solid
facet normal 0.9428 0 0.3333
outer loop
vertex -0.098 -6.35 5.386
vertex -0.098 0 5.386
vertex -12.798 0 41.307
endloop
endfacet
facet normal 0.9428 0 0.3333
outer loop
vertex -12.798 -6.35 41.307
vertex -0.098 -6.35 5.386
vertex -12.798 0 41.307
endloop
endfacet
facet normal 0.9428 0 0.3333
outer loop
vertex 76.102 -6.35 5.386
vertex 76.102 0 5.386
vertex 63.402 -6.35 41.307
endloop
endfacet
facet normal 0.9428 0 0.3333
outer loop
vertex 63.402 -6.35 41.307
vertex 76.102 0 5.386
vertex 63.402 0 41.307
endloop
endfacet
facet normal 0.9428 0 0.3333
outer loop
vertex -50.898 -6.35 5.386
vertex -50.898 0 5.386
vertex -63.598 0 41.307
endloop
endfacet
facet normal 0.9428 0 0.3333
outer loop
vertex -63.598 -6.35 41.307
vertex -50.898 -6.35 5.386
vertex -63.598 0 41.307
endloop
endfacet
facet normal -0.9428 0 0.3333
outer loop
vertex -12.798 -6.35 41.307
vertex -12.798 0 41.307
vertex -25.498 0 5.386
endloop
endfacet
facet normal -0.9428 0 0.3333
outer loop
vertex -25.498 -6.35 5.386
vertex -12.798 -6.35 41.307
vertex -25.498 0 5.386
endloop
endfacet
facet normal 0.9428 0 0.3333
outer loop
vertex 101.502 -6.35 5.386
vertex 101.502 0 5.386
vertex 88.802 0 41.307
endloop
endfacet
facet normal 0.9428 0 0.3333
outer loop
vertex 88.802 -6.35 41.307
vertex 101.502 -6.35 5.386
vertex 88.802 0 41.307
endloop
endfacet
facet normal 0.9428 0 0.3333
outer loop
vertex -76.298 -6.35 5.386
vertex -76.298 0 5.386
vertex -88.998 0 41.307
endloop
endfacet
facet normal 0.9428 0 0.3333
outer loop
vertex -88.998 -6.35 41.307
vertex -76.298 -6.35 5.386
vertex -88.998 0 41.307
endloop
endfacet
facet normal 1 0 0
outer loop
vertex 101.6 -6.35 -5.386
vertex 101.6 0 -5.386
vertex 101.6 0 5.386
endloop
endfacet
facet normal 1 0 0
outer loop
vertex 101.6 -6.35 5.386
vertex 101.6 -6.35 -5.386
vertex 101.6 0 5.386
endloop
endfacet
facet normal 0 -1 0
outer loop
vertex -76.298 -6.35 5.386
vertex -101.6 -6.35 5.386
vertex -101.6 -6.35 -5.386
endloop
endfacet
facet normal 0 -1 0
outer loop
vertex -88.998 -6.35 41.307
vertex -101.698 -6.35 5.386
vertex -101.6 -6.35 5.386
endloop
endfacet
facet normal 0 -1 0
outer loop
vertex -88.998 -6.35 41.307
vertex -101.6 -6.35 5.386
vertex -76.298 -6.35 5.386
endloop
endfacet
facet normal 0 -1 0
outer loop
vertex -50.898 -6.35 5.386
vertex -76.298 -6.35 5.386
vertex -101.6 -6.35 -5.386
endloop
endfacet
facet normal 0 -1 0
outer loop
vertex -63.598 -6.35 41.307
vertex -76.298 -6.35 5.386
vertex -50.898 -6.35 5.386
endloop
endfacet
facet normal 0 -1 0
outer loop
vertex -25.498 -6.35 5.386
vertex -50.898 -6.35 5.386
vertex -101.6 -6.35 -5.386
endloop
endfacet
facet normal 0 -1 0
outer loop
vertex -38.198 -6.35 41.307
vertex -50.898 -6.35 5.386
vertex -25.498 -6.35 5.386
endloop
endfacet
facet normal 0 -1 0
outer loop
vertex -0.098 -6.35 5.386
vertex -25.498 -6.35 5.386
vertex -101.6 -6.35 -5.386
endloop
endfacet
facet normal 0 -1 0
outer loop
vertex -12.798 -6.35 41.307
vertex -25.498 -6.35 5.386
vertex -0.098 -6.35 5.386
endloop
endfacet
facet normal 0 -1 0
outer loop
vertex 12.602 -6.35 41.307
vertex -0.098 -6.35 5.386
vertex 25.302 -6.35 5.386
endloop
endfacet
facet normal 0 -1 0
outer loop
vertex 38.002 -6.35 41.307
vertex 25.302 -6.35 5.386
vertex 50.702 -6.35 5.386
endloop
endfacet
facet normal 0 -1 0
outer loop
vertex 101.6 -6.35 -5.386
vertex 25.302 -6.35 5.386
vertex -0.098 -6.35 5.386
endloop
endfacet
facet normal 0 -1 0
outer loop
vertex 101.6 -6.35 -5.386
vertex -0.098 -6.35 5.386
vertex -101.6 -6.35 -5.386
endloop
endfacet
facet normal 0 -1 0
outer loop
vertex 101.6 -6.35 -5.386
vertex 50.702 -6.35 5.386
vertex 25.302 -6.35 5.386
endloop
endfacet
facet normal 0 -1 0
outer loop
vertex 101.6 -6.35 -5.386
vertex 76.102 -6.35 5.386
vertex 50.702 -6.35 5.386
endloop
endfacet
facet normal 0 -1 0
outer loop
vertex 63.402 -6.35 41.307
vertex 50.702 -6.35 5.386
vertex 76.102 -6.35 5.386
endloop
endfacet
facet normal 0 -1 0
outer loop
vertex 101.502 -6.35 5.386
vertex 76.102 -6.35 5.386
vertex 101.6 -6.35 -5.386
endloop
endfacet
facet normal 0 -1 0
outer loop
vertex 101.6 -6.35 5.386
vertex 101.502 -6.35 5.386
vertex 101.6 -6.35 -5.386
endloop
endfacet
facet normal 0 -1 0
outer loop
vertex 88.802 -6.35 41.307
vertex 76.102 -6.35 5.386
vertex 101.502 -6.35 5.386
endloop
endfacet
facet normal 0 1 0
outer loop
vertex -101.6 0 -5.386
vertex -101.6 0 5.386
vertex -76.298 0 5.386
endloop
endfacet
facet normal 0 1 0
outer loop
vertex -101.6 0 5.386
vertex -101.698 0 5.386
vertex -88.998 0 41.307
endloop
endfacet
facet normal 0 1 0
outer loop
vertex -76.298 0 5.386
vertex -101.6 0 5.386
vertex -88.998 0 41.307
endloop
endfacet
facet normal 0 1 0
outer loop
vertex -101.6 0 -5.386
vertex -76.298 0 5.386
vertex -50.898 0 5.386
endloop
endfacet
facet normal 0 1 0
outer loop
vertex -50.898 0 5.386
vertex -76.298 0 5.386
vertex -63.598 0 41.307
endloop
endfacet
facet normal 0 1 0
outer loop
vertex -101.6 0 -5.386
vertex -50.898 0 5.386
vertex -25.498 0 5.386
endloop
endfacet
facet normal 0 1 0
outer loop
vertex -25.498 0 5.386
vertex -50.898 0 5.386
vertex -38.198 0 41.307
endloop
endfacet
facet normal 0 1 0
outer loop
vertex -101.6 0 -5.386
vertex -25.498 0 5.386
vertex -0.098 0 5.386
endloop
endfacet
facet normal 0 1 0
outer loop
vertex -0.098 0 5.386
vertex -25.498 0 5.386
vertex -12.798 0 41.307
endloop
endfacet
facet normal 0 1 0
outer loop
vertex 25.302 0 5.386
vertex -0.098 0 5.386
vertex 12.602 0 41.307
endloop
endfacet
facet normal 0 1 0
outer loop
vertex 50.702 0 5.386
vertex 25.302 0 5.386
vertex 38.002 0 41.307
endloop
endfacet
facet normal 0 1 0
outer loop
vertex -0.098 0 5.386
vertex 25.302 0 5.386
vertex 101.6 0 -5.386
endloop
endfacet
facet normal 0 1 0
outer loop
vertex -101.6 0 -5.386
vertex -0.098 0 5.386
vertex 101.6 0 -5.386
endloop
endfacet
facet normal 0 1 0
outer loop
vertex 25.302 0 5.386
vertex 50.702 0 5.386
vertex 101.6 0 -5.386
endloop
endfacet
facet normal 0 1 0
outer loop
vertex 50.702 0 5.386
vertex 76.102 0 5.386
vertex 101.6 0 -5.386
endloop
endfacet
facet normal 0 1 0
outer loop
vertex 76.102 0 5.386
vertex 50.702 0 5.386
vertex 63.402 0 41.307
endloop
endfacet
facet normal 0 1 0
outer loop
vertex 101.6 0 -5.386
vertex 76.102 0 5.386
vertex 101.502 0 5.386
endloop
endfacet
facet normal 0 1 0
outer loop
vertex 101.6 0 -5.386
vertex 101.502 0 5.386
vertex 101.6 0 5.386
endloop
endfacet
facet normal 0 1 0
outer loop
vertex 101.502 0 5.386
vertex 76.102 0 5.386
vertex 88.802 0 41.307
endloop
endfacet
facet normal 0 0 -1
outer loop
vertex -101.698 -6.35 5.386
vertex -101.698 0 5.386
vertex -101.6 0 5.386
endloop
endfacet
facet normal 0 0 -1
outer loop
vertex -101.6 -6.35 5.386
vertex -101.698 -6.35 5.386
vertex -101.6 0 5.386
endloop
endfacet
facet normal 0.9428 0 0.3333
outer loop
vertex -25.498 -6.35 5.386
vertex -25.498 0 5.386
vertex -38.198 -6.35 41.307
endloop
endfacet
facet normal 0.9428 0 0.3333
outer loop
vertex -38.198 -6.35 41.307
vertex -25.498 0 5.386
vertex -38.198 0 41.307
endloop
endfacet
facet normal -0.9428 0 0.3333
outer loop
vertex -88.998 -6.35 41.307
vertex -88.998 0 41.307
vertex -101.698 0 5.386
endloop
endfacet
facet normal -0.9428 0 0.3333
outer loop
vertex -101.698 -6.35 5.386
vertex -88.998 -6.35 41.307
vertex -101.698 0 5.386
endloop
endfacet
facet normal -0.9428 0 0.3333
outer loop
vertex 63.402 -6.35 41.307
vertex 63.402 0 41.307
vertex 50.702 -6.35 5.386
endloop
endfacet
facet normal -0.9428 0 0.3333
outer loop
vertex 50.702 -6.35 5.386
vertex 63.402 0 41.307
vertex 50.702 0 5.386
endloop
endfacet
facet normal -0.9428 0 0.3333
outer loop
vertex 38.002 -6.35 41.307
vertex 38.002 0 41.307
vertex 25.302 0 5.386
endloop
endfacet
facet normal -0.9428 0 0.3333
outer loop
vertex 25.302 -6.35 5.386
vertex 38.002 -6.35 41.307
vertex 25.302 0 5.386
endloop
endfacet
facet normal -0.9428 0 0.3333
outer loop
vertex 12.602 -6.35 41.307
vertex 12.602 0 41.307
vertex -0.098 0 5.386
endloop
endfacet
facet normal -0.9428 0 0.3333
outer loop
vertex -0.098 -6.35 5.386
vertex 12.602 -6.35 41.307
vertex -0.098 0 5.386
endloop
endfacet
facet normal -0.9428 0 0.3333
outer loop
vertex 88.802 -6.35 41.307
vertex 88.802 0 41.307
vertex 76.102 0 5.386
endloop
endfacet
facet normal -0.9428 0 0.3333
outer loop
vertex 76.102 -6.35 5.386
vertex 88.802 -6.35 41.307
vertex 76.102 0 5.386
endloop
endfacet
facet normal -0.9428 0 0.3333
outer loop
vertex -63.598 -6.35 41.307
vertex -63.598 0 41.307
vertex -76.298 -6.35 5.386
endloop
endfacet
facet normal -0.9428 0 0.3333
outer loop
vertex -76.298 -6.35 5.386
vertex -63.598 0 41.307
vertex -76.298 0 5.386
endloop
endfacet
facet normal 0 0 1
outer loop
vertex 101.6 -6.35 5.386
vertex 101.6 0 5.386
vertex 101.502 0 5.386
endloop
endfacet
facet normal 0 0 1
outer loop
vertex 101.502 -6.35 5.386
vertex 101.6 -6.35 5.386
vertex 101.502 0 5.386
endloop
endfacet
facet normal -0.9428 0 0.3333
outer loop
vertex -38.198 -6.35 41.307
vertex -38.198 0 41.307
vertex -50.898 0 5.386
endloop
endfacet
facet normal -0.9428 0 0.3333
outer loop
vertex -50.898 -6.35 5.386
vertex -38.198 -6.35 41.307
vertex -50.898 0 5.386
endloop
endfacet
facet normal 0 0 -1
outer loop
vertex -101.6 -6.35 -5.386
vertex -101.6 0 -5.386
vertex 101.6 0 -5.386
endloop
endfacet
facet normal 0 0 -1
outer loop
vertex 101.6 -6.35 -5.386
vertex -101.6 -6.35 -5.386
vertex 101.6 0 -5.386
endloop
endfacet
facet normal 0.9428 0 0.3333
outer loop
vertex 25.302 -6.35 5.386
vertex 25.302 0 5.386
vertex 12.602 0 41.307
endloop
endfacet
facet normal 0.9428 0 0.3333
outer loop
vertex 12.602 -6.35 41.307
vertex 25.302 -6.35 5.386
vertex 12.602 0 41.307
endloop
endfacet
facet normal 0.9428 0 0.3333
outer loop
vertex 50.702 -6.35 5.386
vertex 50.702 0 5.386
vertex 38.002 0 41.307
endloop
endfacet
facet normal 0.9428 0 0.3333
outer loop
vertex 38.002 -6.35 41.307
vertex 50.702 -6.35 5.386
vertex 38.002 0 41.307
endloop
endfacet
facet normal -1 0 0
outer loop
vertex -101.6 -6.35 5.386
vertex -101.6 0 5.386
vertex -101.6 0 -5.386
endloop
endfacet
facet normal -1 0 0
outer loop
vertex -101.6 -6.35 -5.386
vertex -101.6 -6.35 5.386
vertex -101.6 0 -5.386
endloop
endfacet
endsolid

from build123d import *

# Parameters (mm, degrees)
F1_DEPTH = 6.35


with BuildPart() as f1:
    # F0 (on Front) → F1 (new body)
    with BuildSketch(Plane.XZ):
        Polygon((-101.698373, 5.38623), (-101.6, 5.38623), (-76.298373, 5.38623), (-88.998373, 41.307255), align=None)
        Polygon((-76.298373, 5.38623), (-101.6, 5.38623), (-101.6, -5.38623), (101.6, -5.38623), (101.6, 5.38623), (101.501627, 5.38623), (76.101627, 5.38623), (50.701627, 5.38623), (25.301627, 5.38623), (-0.098373, 5.38623), (-25.498373, 5.38623), (-50.898373, 5.38623), align=None)
        Polygon((-63.598373, 41.307255), (-76.298373, 5.38623), (-50.898373, 5.38623), align=None)
        Polygon((-38.198373, 41.307255), (-50.898373, 5.38623), (-25.498373, 5.38623), align=None)
        Polygon((-12.798373, 41.307255), (-25.498373, 5.38623), (-0.098373, 5.38623), align=None)
        Polygon((12.601627, 41.307255), (-0.098373, 5.38623), (25.301627, 5.38623), align=None)
        Polygon((76.101627, 5.38623), (101.501627, 5.38623), (88.801627, 41.307255), align=None)
        Polygon((38.001627, 41.307255), (25.301627, 5.38623), (50.701627, 5.38623), align=None)
        Polygon((50.701627, 5.38623), (76.101627, 5.38623), (63.401627, 41.307255), align=None)
    extrude(amount=F1_DEPTH)


solid = f1.part
